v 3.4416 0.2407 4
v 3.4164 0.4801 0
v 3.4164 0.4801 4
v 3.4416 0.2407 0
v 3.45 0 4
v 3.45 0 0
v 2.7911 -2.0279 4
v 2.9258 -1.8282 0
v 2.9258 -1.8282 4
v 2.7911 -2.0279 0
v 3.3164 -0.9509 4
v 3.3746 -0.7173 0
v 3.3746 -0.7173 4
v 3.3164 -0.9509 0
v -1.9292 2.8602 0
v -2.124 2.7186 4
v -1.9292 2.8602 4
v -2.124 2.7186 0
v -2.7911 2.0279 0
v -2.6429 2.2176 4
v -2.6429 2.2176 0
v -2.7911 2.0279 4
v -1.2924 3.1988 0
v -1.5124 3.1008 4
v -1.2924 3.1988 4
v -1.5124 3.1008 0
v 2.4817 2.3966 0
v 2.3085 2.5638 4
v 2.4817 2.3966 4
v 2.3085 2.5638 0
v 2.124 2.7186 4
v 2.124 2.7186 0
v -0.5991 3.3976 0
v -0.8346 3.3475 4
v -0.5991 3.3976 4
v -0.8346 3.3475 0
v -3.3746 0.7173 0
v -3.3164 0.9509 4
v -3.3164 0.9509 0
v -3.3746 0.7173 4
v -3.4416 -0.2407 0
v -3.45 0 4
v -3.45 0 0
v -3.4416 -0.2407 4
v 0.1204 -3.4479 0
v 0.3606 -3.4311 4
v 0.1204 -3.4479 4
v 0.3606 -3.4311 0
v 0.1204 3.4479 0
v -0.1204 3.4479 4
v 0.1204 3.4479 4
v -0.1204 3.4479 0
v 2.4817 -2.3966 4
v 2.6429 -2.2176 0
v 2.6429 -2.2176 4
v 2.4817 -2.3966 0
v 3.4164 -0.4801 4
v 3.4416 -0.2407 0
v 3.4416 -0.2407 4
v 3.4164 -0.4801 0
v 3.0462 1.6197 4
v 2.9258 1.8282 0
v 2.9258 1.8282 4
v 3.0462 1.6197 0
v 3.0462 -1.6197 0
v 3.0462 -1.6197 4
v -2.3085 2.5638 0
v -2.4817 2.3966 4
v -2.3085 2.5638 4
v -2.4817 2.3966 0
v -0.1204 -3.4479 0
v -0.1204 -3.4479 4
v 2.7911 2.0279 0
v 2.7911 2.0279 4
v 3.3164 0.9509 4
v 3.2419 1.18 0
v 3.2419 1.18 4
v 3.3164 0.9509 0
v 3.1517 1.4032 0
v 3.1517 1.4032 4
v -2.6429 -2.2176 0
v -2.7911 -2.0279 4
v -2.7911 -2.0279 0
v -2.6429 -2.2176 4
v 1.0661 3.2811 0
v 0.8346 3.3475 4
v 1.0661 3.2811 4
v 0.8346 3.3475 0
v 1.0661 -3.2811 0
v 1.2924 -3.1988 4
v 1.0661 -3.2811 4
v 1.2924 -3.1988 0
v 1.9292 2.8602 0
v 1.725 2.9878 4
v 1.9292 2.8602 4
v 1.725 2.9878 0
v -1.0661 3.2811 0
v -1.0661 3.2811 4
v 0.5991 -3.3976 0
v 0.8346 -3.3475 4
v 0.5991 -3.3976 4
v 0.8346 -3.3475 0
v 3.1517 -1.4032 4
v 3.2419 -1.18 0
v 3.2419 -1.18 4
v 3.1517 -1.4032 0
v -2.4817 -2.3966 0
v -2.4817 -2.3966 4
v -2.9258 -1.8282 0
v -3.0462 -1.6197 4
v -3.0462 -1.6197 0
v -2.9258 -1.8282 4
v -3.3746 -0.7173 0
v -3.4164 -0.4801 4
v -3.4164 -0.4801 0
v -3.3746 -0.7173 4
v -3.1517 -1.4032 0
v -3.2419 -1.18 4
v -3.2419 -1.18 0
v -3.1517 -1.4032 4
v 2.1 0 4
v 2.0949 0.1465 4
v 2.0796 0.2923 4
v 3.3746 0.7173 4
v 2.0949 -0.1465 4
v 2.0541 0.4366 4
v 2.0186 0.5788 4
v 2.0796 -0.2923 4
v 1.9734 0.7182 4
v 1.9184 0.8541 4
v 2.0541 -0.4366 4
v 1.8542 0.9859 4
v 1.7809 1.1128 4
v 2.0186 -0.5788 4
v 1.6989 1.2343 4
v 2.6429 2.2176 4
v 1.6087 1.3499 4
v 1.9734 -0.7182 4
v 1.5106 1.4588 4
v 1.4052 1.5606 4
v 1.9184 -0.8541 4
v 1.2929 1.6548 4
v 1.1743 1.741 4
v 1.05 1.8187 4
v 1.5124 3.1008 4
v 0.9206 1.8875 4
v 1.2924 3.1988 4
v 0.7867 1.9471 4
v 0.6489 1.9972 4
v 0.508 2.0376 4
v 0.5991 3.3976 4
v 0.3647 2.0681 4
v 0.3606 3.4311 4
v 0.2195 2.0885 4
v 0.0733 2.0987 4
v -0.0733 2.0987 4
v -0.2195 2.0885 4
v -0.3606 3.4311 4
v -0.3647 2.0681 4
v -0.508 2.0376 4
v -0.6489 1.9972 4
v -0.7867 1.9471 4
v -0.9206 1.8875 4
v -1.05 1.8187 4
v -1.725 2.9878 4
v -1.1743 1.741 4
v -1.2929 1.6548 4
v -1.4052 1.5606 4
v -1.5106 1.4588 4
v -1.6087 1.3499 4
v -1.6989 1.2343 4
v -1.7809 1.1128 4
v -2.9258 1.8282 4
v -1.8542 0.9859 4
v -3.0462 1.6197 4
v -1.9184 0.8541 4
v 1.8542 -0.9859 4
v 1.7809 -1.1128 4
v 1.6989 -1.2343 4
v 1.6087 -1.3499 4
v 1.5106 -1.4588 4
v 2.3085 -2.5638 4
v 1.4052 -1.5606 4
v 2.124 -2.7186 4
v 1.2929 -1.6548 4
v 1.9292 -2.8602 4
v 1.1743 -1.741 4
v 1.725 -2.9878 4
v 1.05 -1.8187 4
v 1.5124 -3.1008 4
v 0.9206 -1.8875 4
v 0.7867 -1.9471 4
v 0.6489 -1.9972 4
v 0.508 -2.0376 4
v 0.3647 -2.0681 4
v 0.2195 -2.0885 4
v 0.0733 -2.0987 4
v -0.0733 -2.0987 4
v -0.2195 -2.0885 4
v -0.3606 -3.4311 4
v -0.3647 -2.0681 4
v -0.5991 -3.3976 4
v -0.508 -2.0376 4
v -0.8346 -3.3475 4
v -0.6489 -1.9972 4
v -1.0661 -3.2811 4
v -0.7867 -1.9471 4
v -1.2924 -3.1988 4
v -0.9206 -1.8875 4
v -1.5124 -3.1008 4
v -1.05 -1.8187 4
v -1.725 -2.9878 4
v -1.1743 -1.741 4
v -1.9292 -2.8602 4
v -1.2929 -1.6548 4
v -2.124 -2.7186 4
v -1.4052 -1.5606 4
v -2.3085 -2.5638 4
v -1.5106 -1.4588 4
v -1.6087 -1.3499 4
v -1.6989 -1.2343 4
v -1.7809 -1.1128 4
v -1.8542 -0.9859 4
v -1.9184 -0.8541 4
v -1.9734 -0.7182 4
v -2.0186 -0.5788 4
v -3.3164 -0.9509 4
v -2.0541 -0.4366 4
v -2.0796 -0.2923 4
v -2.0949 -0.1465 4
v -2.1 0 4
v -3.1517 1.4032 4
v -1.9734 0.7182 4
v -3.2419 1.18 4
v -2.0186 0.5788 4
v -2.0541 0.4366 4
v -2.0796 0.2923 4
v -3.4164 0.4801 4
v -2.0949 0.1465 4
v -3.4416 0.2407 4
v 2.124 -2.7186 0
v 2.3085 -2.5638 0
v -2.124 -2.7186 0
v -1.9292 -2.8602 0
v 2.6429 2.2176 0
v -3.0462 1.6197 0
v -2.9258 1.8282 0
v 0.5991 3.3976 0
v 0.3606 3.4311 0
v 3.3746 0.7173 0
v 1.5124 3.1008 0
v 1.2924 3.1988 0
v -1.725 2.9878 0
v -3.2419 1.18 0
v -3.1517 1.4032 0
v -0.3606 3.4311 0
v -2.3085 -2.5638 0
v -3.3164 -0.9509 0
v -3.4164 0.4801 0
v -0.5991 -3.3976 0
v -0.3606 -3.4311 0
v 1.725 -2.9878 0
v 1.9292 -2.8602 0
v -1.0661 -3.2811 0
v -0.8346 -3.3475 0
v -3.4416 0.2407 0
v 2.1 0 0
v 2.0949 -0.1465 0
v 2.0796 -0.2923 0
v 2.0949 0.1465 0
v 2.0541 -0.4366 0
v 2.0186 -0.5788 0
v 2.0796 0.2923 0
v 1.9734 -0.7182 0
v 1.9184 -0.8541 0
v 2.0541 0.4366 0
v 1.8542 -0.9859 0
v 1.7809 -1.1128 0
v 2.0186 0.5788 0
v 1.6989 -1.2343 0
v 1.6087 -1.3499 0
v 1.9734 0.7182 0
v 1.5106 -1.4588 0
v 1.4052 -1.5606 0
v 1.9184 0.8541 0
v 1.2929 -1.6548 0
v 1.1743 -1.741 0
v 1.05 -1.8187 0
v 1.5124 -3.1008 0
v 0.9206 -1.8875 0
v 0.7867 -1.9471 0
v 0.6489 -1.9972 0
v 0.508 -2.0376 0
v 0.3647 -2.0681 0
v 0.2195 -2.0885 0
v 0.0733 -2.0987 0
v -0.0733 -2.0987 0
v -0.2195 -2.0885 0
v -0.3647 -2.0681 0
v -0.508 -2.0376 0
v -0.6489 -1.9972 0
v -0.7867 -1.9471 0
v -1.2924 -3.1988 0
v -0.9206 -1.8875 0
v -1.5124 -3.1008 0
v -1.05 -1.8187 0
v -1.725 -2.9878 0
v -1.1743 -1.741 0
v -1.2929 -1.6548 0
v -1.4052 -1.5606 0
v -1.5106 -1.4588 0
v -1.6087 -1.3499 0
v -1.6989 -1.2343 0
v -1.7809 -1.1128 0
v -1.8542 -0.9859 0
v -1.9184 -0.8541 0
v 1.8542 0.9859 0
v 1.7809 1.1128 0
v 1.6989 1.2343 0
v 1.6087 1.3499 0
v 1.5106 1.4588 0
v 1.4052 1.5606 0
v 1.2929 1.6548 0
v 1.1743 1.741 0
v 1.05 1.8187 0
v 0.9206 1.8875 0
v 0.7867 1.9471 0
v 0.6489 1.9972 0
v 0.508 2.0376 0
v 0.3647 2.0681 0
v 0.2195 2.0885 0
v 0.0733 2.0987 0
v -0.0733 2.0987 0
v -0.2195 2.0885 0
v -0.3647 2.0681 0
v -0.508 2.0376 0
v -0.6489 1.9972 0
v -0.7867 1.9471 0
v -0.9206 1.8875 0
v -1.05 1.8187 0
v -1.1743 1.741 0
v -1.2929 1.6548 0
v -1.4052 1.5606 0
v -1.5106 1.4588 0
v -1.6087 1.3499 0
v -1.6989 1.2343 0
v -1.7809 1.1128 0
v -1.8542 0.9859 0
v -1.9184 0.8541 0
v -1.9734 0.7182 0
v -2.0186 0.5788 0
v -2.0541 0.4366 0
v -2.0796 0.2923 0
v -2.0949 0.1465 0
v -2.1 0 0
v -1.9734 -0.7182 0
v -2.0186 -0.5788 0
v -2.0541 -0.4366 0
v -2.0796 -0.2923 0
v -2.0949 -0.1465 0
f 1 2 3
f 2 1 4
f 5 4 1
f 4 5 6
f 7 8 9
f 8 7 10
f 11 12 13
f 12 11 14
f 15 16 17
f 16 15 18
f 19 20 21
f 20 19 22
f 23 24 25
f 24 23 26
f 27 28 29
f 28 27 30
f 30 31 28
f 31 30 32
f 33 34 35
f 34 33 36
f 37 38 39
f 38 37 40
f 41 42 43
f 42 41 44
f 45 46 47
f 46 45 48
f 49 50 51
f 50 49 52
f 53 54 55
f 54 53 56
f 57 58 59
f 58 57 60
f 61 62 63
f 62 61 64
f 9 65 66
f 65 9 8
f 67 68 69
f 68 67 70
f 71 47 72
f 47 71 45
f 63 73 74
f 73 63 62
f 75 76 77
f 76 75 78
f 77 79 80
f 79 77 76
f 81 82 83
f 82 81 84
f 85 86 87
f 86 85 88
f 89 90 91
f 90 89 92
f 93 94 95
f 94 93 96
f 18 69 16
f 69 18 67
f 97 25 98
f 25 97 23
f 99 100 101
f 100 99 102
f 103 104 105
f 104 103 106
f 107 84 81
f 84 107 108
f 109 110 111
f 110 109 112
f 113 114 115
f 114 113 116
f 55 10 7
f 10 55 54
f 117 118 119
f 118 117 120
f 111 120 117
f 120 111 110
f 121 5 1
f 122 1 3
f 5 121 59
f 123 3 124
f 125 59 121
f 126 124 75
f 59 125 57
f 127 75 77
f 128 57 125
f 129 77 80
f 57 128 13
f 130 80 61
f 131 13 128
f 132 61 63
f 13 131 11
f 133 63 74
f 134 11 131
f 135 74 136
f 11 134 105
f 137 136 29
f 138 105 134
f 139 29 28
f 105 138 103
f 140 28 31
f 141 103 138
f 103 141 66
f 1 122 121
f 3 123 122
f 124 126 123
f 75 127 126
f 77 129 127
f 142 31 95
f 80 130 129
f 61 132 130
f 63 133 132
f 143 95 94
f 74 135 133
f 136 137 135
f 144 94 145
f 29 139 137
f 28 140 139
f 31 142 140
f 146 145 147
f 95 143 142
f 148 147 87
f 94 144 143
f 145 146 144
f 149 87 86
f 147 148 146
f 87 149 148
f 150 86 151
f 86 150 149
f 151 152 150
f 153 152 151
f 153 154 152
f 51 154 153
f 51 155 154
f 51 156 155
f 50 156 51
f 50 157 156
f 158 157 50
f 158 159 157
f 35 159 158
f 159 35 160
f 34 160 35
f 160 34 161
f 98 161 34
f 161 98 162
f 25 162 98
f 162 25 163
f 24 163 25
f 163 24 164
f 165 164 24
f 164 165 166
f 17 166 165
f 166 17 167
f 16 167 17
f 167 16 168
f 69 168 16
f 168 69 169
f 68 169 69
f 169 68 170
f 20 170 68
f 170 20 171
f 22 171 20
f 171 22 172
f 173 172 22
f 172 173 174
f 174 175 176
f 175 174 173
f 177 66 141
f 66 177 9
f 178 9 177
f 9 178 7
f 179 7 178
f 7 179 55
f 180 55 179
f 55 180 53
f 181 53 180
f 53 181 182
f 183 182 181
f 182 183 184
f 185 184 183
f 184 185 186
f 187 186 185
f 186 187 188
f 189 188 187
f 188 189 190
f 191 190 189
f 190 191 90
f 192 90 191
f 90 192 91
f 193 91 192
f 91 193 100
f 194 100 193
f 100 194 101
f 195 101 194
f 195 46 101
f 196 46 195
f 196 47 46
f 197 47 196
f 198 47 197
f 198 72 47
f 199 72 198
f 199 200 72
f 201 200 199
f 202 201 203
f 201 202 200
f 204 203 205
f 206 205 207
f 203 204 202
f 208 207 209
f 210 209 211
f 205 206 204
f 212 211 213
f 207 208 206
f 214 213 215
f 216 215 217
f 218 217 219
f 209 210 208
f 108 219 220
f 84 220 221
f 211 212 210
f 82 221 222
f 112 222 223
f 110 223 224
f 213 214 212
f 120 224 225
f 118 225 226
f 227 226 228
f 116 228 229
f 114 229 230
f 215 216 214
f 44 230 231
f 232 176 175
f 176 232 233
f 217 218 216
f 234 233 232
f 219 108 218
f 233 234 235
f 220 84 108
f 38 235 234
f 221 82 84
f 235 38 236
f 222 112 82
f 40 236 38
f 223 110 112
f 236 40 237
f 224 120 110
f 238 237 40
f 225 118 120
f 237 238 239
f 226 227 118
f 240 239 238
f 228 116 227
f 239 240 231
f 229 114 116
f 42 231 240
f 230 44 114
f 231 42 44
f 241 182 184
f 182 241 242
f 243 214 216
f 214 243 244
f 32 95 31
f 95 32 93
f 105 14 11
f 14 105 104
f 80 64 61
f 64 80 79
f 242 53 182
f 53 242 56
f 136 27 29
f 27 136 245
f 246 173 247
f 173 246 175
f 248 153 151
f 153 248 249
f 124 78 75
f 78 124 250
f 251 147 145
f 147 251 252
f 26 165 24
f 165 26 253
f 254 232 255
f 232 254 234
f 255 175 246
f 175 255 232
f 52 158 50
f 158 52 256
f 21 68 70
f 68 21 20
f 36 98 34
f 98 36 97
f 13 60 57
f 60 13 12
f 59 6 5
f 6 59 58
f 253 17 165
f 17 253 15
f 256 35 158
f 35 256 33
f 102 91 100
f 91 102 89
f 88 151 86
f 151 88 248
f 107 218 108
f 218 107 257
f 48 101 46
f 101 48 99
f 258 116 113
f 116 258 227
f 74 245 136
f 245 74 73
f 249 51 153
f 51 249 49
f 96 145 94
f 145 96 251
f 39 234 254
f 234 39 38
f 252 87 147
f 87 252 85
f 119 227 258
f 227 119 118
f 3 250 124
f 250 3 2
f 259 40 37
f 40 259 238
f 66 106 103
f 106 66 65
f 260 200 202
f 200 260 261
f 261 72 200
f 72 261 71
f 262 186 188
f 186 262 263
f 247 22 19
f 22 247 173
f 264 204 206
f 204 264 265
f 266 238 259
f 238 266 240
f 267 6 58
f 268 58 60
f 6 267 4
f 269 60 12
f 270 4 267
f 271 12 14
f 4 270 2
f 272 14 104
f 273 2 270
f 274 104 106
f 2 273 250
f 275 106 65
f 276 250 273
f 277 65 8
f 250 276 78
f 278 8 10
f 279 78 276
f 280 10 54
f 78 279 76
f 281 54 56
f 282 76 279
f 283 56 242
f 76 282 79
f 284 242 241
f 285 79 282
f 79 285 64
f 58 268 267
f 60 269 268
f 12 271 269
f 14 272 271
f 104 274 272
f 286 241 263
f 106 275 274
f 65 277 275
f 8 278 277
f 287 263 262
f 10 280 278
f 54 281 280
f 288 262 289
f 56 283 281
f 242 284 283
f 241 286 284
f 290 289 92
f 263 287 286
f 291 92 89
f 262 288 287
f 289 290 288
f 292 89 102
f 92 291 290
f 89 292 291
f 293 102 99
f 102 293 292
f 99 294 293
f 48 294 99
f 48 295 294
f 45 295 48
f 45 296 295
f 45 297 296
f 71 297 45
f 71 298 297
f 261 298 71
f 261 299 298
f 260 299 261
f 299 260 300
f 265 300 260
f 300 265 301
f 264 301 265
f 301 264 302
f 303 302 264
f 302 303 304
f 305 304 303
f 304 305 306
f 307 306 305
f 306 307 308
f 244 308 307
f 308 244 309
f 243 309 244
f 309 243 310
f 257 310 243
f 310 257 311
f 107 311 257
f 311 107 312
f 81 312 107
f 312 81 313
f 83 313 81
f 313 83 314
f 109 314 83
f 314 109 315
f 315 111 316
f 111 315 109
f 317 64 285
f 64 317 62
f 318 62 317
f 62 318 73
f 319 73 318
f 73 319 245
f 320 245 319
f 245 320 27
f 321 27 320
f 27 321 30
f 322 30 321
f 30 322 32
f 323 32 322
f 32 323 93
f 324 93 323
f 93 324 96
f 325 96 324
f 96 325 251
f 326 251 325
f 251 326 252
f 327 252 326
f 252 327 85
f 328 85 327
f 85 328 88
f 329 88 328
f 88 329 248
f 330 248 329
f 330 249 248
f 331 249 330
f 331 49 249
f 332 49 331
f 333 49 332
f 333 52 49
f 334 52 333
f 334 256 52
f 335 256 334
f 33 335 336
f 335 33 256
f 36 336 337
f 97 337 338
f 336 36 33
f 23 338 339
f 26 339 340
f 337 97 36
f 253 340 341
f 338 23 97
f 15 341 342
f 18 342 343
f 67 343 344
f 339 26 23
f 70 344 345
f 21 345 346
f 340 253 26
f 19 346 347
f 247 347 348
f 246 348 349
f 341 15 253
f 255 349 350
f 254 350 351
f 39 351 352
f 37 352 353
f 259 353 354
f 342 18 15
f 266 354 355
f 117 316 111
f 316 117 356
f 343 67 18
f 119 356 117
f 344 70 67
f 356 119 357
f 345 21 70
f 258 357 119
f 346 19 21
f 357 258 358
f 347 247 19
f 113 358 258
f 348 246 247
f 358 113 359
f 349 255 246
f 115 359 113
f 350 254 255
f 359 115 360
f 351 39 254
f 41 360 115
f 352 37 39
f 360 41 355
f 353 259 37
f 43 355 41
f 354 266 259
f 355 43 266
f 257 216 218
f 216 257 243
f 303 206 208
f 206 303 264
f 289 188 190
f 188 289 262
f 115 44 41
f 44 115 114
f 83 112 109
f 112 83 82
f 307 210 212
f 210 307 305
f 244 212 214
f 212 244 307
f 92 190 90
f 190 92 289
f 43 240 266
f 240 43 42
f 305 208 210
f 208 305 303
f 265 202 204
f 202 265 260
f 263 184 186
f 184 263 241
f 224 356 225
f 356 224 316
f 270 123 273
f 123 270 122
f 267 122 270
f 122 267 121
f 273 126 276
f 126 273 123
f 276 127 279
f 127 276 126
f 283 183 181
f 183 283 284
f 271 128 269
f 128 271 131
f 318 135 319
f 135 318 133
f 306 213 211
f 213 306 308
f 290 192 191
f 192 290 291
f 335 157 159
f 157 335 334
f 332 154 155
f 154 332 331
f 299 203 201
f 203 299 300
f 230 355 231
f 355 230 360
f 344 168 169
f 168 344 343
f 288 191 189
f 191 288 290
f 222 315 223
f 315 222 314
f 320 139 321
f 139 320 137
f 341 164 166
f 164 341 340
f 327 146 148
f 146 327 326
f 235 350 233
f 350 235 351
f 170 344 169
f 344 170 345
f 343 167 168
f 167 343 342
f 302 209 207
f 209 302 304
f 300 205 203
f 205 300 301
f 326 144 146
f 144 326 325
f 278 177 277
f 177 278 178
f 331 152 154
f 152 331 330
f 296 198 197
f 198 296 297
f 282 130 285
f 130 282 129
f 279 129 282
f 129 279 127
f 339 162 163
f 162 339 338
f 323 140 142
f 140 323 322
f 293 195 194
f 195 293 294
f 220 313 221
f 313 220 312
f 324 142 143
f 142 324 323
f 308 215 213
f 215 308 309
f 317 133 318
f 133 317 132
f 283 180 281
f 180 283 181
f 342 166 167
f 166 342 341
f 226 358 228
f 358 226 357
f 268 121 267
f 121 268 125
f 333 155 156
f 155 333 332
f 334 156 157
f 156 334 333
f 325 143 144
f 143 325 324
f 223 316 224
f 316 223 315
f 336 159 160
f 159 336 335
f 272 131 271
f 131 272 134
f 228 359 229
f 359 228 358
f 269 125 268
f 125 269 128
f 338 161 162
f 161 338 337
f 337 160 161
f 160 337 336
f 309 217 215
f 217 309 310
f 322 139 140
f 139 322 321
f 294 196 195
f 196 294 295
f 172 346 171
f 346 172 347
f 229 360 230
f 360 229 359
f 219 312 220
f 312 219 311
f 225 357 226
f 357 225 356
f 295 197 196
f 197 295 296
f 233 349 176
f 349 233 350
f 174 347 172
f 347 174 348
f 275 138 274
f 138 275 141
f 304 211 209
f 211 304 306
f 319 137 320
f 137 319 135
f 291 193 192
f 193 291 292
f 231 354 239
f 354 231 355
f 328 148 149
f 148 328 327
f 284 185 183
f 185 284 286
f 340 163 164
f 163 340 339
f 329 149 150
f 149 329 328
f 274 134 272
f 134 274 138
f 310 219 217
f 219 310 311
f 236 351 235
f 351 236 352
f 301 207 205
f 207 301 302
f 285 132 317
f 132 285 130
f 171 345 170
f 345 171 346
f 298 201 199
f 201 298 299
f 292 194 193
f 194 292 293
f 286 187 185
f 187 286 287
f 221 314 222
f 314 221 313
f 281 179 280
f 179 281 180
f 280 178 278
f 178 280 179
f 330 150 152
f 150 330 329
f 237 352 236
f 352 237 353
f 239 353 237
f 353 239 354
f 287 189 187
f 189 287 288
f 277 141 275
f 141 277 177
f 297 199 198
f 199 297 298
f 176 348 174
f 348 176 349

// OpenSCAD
$fn = 90;

difference(){
    cylinder(d = 6.9, h = 4);
    translate([0, 0, -1]) cylinder(d = 4.2, h = 8);
}
